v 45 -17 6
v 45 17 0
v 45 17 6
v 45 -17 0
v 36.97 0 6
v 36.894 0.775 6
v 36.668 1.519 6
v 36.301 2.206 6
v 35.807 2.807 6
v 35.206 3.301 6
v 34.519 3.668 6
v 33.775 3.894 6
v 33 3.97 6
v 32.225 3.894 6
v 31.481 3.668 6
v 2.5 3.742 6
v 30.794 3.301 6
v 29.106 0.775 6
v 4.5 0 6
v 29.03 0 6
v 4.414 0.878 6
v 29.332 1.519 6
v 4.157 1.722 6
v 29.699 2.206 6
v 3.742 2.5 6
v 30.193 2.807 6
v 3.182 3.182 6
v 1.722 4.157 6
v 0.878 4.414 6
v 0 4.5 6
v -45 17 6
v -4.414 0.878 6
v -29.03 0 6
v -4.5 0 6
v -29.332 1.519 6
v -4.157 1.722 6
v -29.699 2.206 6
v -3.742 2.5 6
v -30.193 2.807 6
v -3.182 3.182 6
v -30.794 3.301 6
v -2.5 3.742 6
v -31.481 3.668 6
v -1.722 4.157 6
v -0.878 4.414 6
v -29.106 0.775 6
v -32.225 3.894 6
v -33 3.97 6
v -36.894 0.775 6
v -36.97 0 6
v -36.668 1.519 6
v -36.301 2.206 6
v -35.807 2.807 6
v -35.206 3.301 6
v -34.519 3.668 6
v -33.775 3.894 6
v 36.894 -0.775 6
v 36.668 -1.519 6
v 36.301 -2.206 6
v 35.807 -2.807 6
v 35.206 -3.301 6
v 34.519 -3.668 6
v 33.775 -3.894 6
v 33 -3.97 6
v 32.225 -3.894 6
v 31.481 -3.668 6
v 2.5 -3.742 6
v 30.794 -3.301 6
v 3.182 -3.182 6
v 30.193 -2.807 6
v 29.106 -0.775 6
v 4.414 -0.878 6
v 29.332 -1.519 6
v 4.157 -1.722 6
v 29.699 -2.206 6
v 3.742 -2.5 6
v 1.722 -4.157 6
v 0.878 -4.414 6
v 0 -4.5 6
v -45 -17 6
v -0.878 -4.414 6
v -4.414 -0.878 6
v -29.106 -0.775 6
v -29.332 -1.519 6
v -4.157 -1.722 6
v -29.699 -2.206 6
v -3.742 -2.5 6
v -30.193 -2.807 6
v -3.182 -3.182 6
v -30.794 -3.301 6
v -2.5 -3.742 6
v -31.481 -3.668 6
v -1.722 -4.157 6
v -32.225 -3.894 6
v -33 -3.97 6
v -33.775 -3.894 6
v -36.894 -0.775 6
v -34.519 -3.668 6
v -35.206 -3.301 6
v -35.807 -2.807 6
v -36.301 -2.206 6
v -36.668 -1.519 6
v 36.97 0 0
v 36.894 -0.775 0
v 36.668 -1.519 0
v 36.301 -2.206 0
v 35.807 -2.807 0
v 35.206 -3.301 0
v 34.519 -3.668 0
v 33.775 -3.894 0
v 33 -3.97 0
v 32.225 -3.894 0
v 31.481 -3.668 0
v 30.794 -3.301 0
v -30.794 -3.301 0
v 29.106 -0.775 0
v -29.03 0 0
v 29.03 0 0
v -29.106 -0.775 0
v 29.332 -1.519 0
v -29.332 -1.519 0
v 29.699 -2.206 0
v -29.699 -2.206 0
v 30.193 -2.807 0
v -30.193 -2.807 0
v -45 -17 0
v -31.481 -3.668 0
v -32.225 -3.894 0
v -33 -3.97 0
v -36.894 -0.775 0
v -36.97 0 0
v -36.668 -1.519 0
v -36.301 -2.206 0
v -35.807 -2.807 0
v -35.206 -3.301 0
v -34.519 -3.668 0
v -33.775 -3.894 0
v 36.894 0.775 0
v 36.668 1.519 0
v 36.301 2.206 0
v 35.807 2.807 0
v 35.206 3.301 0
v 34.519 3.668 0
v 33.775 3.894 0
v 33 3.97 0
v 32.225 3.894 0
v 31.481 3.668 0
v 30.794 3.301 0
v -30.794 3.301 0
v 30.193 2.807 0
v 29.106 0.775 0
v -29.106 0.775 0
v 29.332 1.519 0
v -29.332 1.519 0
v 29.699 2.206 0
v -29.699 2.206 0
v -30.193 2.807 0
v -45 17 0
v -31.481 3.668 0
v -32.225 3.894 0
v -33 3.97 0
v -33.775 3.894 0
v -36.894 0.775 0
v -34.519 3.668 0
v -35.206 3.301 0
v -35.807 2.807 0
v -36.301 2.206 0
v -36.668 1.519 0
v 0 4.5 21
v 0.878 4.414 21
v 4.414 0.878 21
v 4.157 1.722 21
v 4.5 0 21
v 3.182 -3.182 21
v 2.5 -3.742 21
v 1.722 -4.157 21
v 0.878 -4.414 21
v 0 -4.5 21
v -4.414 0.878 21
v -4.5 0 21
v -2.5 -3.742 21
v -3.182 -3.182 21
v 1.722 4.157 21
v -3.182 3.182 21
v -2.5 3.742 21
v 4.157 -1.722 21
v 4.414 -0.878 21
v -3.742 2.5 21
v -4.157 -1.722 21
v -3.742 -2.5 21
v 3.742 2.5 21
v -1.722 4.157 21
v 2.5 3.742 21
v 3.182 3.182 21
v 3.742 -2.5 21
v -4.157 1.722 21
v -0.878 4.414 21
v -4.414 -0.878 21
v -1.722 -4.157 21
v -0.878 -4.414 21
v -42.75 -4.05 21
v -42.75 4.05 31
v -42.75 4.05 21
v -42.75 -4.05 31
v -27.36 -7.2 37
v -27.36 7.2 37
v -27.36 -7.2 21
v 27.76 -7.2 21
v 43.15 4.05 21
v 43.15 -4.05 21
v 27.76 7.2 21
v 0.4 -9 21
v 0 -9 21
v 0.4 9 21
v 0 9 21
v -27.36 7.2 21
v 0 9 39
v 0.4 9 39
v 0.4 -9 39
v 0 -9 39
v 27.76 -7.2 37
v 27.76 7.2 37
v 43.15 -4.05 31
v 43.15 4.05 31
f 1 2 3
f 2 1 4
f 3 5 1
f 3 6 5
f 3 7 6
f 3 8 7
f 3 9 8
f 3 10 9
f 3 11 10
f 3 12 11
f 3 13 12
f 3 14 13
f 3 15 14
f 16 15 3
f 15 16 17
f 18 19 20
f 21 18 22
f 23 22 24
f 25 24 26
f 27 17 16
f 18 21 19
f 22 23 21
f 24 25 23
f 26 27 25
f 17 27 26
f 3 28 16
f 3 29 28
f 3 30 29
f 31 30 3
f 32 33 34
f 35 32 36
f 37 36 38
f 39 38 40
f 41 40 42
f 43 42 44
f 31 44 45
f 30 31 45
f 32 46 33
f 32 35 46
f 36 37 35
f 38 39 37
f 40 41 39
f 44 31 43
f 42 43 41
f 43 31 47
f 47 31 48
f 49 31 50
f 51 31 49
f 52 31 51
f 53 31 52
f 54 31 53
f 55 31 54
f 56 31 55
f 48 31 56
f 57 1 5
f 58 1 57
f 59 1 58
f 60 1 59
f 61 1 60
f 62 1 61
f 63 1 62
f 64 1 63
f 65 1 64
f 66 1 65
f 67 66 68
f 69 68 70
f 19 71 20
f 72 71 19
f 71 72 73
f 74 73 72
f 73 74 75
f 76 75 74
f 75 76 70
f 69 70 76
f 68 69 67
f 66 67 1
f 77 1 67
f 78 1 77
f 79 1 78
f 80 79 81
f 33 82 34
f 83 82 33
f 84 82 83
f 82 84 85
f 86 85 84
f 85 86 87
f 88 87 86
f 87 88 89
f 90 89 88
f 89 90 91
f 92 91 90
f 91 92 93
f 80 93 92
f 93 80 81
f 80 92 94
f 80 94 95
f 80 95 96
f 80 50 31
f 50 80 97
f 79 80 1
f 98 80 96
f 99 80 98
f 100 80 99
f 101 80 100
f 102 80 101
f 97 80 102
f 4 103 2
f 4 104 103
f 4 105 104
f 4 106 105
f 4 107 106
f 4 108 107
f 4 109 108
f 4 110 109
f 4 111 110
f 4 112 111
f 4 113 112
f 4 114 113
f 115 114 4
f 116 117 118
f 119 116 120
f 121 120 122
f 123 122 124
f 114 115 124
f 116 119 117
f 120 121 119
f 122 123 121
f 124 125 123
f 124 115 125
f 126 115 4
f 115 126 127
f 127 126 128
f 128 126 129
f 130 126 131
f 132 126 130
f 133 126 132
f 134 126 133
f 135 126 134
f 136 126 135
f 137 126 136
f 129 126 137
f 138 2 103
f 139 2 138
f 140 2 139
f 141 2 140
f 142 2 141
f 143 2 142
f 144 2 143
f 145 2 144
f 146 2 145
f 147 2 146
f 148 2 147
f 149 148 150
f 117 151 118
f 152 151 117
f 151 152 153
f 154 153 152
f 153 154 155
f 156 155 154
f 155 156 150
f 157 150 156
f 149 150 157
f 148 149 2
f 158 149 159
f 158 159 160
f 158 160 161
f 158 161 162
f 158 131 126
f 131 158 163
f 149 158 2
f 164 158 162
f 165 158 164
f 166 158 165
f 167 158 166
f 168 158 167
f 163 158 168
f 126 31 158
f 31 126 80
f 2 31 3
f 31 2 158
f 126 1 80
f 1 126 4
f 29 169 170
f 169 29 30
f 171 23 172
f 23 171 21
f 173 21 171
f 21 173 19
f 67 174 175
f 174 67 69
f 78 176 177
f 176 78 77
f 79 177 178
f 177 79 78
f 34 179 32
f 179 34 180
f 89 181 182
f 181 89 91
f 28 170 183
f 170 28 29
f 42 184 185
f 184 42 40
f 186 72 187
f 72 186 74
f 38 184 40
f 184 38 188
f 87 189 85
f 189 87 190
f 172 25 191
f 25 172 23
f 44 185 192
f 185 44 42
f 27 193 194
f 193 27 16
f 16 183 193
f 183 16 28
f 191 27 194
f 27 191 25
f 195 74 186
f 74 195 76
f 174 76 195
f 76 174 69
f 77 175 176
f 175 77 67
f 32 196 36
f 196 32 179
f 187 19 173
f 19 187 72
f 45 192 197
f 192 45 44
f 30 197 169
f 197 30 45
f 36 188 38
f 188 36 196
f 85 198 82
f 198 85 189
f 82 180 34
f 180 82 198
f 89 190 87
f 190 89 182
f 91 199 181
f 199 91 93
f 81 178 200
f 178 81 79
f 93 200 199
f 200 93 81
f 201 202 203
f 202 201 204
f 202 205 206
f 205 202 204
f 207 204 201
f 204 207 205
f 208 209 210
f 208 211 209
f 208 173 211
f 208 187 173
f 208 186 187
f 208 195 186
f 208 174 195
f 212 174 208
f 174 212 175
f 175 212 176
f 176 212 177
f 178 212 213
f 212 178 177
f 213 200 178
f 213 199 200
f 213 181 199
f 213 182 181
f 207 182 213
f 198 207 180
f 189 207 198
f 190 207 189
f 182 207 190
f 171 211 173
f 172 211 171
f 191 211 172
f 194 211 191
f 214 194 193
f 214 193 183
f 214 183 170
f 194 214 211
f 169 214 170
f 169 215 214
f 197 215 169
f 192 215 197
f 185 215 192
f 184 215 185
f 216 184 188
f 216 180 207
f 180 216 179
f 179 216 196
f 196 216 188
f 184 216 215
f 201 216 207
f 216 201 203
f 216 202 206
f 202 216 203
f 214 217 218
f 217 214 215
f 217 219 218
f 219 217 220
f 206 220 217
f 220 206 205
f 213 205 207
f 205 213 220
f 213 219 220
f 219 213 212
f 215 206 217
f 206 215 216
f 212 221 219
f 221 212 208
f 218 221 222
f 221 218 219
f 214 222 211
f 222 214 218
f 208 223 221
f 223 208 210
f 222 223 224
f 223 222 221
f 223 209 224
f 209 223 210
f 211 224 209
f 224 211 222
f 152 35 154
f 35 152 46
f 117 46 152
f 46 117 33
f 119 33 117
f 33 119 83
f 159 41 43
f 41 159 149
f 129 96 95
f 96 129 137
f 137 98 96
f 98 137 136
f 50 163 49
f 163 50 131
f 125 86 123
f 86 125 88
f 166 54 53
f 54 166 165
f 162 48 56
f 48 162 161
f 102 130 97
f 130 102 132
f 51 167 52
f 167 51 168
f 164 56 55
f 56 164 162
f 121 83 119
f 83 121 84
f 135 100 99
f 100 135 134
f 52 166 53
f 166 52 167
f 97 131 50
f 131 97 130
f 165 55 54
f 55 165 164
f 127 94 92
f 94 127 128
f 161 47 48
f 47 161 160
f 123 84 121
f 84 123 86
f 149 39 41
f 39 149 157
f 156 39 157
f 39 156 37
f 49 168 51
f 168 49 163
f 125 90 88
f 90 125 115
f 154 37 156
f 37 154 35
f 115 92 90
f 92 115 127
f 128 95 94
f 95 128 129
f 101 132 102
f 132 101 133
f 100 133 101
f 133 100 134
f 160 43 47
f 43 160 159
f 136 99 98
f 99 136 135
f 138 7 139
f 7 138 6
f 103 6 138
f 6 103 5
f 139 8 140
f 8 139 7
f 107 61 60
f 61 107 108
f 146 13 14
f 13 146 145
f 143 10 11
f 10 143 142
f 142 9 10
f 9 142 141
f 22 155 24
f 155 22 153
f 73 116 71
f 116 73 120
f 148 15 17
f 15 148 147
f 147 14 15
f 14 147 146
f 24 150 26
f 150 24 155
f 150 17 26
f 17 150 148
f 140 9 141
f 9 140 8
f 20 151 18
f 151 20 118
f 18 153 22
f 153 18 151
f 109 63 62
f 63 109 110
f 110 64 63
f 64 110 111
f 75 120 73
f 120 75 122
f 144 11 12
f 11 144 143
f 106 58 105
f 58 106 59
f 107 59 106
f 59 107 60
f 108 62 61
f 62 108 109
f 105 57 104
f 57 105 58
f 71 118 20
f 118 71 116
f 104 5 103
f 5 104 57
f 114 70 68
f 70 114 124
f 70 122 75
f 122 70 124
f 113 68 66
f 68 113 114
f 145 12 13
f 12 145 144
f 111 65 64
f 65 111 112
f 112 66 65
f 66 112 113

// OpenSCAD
$fn = 32;

// ----------------------------------------------------------------------
// Boat cleat: 90 mm base, horn 30 mm up
// ----------------------------------------------------------------------

// --- parameters (mm) ---
base_l = 90;              // base length
base_w = 34;              // base width
base_t = 6;               // base thickness
horn_len = 85.5;          // horn length
horn_d = 18;              // horn diameter at the middle
horn_z = 30;              // horn axis height
end_drop = 8;             // how far the horn tips drop
post_d = 9;               // centre post diameter
holes_d = 7.94;           // fixing holes
hole_x = 33;              // fixing hole spacing

difference() {
  union() {
    translate([-45, -17, 0]) cube([base_l, base_w, base_t]);
    /* centre post, sunk 1 mm into the base */
    translate([0, 0, 5]) cylinder(h = 25, d = post_d);
    /* horn: a hull chain of boxes, full in the middle and lighter at the tips */
    hull() {
      translate([-42.75, -4.05, 21]) cube([0.4, 8.1, 10], center = false);
      translate([-27.36, -7.2, 21]) cube([0.4, 14.4, 16], center = false);
    }
    hull() {
      translate([-27.36, -7.2, 21]) cube([0.4, 14.4, 16], center = false);
      translate([0, -9, 21]) cube([0.4, 18, 18], center = false);
    }
    hull() {
      translate([0, -9, 21]) cube([0.4, 18, 18], center = false);
      translate([27.36, -7.2, 21]) cube([0.4, 14.4, 16], center = false);
    }
    hull() {
      translate([27.36, -7.2, 21]) cube([0.4, 14.4, 16], center = false);
      translate([42.75, -4.05, 21]) cube([0.4, 8.1, 10], center = false);
    }
  }
  translate([-33, 0, -2.5]) cylinder(h = base_t + 5, d = holes_d);
  translate([33, 0, -2.5]) cylinder(h = base_t + 5, d = holes_d);
}
